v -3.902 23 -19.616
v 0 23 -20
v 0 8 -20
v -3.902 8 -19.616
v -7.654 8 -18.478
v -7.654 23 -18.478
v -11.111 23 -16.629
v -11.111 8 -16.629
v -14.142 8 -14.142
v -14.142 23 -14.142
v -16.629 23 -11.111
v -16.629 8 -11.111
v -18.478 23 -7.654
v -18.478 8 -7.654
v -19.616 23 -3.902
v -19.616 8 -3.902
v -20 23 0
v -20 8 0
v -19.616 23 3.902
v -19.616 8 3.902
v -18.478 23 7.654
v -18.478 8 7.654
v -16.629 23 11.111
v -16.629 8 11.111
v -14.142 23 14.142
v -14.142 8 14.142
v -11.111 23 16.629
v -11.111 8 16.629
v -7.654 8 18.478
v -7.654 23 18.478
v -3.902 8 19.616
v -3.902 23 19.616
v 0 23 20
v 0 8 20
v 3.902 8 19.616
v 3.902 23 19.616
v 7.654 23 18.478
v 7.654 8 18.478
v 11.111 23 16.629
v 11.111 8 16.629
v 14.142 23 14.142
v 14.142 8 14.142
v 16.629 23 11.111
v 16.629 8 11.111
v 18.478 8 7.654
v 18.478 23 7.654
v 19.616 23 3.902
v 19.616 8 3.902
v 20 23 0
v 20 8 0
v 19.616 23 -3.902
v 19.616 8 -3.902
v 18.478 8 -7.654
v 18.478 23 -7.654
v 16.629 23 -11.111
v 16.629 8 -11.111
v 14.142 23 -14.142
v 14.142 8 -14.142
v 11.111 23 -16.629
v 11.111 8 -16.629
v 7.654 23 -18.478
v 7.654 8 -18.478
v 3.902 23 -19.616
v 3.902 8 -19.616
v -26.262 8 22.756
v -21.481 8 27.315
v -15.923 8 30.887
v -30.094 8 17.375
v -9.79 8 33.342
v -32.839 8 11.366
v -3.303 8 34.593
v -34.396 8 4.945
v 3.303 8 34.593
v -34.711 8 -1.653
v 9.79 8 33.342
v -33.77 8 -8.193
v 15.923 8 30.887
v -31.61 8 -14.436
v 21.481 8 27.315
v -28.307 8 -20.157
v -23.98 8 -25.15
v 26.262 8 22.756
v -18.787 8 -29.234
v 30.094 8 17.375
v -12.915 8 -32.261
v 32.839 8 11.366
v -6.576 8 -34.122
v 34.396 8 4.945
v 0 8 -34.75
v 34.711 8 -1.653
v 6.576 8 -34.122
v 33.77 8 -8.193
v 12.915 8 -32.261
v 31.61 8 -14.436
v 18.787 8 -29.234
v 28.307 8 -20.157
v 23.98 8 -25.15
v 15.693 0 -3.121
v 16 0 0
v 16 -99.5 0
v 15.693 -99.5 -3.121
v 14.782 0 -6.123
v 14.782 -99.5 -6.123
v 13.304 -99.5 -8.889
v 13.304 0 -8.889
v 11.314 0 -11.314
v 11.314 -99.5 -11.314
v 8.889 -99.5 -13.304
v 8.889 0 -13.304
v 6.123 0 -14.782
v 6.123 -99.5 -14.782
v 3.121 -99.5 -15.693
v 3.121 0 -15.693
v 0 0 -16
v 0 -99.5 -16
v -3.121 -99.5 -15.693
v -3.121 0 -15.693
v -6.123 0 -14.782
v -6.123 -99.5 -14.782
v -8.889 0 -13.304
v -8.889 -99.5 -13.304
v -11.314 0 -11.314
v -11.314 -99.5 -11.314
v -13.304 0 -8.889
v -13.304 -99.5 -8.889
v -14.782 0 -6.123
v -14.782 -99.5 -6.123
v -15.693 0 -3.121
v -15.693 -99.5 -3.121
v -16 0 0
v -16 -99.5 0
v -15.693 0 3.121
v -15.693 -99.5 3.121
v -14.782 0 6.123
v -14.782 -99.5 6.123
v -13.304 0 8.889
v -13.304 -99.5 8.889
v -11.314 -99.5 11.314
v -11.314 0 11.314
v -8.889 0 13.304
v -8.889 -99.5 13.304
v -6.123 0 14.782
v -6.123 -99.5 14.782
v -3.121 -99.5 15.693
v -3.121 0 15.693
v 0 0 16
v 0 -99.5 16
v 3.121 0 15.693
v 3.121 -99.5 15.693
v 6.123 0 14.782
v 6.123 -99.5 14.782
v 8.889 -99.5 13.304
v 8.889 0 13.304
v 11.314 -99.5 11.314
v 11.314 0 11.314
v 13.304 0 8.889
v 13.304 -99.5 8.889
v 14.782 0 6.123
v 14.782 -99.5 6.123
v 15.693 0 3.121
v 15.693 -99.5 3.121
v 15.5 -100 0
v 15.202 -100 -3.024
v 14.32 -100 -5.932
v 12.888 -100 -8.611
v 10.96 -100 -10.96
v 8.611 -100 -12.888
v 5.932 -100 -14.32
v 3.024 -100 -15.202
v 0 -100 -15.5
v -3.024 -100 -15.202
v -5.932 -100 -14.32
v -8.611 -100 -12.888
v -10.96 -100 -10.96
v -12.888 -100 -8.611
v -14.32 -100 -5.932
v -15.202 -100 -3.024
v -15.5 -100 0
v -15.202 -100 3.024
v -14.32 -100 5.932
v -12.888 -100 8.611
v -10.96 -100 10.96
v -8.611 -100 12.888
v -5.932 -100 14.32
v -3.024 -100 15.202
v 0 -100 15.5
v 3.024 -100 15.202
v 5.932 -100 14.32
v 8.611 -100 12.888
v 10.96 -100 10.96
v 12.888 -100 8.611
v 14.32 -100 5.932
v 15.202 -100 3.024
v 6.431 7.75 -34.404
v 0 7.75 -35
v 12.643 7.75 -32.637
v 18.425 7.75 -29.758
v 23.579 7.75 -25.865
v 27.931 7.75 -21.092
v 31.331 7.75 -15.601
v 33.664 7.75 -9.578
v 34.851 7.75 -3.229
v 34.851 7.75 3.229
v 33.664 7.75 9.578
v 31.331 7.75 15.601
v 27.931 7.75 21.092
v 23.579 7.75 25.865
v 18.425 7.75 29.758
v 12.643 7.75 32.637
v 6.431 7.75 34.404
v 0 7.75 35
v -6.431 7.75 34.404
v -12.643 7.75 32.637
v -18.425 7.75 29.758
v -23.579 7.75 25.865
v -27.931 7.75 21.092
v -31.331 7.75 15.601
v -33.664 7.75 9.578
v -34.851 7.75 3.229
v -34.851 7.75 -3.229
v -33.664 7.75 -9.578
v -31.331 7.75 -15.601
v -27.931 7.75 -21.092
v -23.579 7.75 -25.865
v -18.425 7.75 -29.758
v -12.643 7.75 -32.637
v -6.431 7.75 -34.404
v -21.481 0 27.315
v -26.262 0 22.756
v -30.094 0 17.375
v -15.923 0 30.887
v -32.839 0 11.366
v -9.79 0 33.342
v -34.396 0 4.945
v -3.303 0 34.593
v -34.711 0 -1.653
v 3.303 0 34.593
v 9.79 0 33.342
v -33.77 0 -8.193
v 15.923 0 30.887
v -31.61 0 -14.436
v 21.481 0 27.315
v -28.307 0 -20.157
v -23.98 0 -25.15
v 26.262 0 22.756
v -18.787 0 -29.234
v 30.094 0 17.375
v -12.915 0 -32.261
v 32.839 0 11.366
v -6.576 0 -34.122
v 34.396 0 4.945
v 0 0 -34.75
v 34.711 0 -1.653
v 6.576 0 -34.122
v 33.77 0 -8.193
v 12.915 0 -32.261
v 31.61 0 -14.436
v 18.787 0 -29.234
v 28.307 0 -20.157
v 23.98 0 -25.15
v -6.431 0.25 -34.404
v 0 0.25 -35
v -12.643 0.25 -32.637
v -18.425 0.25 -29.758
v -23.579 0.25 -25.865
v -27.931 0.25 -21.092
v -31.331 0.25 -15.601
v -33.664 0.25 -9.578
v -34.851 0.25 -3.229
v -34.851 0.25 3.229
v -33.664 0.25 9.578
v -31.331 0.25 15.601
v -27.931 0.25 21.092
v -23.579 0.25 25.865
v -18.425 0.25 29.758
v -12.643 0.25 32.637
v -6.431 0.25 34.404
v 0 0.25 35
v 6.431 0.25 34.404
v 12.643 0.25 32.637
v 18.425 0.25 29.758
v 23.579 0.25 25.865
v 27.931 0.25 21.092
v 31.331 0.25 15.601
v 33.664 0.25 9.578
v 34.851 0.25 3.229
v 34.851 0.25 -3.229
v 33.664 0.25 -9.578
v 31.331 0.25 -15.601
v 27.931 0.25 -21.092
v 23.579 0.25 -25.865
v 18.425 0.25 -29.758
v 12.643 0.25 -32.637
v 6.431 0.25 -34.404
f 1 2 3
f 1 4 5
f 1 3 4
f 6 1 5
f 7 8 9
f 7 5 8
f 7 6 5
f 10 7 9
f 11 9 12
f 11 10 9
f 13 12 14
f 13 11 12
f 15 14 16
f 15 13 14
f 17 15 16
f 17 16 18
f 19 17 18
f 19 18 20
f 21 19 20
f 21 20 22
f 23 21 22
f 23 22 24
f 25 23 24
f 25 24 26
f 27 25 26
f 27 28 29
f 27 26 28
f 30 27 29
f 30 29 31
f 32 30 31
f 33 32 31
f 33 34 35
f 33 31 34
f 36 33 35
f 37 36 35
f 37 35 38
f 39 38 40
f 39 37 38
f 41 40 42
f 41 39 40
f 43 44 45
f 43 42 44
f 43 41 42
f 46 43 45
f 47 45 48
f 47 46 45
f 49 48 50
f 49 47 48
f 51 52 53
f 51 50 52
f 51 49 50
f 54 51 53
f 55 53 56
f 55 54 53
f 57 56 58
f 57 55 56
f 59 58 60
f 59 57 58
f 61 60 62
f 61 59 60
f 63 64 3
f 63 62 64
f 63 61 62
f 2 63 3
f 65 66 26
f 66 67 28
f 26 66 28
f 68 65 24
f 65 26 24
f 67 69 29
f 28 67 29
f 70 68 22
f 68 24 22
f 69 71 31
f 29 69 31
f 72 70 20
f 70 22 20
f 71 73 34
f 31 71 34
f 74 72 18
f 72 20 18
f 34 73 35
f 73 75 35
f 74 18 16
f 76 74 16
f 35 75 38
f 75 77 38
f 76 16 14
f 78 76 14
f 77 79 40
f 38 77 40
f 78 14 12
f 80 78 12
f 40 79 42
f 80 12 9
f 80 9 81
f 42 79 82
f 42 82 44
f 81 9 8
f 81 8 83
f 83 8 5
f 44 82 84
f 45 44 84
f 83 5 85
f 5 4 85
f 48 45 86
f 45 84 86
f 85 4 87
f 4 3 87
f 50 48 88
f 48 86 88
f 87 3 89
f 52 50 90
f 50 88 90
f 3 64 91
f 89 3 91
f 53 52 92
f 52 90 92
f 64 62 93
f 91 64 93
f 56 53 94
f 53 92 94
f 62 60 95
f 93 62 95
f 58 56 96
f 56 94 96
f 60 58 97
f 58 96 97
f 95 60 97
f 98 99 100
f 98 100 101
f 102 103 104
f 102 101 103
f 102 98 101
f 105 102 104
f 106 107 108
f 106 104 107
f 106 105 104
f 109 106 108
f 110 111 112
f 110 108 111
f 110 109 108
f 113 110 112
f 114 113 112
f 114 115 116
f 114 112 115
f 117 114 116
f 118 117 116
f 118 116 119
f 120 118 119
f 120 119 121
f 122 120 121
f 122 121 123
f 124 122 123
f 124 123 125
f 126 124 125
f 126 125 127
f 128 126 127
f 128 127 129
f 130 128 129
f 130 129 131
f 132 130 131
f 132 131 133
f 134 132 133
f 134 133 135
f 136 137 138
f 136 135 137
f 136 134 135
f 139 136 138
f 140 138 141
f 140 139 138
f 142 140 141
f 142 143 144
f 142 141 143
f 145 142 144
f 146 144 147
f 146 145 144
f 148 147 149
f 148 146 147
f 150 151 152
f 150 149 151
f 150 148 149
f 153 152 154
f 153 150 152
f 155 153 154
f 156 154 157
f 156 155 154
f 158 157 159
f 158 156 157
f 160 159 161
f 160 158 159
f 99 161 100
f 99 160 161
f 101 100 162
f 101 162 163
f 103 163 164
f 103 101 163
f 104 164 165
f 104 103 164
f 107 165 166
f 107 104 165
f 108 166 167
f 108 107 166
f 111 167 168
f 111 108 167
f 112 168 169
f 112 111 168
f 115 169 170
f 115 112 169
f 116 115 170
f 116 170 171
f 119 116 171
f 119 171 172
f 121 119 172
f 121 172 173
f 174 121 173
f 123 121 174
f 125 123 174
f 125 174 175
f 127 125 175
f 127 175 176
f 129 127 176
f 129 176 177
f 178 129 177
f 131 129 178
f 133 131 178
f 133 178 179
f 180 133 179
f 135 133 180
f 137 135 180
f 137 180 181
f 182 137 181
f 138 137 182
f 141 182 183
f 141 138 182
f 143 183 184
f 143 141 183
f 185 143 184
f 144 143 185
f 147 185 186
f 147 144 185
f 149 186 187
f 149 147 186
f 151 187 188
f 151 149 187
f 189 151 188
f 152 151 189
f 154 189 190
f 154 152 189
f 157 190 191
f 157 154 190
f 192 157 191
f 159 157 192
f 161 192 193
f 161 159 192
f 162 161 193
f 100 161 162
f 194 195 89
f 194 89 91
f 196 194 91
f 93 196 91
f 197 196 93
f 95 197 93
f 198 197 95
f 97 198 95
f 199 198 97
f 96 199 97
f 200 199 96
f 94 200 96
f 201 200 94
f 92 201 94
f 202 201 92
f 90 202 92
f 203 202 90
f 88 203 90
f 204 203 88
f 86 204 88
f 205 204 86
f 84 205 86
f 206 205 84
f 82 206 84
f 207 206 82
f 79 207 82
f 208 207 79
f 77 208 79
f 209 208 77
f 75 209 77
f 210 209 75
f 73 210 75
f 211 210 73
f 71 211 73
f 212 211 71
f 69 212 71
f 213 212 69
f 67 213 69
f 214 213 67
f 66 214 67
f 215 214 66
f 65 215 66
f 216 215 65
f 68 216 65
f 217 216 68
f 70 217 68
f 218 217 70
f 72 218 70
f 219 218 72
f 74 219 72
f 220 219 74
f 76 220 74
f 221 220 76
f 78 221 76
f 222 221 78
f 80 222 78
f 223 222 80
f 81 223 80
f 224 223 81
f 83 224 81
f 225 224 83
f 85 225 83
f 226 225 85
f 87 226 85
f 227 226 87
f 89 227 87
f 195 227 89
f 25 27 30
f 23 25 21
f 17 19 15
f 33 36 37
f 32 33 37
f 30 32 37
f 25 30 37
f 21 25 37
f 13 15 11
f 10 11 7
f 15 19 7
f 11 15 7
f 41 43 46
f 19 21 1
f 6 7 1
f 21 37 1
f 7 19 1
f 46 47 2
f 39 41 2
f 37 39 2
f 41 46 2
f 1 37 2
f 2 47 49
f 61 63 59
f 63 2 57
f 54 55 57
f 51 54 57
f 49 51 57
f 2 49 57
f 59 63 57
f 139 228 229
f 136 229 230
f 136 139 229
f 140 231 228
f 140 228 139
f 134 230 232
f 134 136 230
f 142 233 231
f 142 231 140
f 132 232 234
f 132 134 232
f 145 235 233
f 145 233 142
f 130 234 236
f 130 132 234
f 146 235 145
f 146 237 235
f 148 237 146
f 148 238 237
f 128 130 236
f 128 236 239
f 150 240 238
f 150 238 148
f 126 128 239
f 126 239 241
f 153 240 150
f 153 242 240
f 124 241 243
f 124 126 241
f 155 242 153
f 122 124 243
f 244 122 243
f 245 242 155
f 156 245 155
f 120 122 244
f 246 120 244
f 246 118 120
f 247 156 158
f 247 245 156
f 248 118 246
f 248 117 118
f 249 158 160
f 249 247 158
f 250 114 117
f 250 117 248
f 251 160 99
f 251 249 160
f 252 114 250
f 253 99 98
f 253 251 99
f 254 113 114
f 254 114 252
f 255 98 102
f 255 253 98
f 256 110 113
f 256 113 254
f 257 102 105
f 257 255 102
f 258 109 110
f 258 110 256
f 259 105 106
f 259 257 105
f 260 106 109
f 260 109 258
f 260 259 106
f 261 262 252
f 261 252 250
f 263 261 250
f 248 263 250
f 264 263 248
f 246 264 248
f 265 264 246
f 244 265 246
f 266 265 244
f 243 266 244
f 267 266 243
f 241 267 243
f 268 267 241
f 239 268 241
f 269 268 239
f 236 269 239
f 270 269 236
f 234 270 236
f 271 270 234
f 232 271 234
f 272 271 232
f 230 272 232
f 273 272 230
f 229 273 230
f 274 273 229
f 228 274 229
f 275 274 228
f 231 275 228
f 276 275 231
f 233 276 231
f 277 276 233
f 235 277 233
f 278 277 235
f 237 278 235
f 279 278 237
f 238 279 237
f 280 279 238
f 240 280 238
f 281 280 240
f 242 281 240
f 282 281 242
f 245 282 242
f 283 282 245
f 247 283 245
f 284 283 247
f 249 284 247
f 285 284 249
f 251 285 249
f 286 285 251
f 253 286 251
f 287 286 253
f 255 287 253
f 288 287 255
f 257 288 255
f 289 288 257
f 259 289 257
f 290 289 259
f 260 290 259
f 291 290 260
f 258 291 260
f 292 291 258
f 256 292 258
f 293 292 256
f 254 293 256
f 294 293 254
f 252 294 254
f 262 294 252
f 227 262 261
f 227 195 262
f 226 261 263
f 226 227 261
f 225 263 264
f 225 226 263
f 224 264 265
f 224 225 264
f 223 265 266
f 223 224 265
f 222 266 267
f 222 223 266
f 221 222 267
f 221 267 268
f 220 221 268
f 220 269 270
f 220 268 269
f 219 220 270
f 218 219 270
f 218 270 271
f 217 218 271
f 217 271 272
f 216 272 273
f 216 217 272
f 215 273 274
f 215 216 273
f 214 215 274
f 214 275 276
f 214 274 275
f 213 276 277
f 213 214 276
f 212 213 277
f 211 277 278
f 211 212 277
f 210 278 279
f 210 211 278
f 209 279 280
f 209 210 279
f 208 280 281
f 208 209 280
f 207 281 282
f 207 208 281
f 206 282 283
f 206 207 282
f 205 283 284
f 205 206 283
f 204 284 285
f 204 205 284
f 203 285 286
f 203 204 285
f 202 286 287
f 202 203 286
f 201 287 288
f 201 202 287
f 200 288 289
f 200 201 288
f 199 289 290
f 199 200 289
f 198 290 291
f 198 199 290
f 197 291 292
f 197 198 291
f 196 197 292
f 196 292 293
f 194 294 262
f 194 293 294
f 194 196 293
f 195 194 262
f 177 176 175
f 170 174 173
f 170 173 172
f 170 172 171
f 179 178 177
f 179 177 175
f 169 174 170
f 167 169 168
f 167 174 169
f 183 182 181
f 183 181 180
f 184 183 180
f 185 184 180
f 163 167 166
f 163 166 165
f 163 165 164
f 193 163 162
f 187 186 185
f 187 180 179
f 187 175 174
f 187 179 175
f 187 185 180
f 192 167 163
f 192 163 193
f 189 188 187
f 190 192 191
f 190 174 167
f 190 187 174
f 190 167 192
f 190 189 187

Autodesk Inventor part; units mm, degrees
ref_plane "YZ Plane" through (0, 0, 0) normal (1, 0, 0) x (0, 1, 0)
ref_plane "XZ Plane" through (0, 0, 0) normal (0, 1, 0) x (-1, 0, 0)
ref_plane "XY Plane" through (0, 0, 0) normal (0, 0, 1) x (1, 0, 0)
sketch "Skizze1" plane through (0, 0, 0) normal (1, 0, 0) x (0, 1, 0)
  line L0 (8, 0) -> (0, 0)
  line L1 (0, 0) -> (0, -35)
  line L2 (0, -35) -> (8, -35)
  line L3 (8, -35) -> (8, 0)
  line L4 (23, 0) -> (8, 0)
  line L5 (8, 0) -> (8, -20)
  line L6 (8, -20) -> (23, -20)
  line L7 (23, -20) -> (23, 0)
  dimension "d0" = 20
  dimension "d1" = 35
  dimension "d2" = 8
  dimension "d3" = 15
revolve "Umdrehung1" add sketch "Skizze1" angle 360 about axis through (0, 23, 0) along (0, -1, 0)
chamfer "Fase1" distance 0.25 angle 45 2 edges at (0, 8, 35) (0, 0, 35)
sketch "Skizze2" plane through (0, 0, 0) normal (0, -1, 0) x (1, 0, 0)
  circle A0 centre (0, 0) radius 16
  dimension "d8" = 32
extrude "Extrusion1" add sketch "Skizze2" along normal blind 100
chamfer "Fase2" distance 0.5 angle 45 1 edges at (-16, -100, 0)
properties part number "Stempel"
